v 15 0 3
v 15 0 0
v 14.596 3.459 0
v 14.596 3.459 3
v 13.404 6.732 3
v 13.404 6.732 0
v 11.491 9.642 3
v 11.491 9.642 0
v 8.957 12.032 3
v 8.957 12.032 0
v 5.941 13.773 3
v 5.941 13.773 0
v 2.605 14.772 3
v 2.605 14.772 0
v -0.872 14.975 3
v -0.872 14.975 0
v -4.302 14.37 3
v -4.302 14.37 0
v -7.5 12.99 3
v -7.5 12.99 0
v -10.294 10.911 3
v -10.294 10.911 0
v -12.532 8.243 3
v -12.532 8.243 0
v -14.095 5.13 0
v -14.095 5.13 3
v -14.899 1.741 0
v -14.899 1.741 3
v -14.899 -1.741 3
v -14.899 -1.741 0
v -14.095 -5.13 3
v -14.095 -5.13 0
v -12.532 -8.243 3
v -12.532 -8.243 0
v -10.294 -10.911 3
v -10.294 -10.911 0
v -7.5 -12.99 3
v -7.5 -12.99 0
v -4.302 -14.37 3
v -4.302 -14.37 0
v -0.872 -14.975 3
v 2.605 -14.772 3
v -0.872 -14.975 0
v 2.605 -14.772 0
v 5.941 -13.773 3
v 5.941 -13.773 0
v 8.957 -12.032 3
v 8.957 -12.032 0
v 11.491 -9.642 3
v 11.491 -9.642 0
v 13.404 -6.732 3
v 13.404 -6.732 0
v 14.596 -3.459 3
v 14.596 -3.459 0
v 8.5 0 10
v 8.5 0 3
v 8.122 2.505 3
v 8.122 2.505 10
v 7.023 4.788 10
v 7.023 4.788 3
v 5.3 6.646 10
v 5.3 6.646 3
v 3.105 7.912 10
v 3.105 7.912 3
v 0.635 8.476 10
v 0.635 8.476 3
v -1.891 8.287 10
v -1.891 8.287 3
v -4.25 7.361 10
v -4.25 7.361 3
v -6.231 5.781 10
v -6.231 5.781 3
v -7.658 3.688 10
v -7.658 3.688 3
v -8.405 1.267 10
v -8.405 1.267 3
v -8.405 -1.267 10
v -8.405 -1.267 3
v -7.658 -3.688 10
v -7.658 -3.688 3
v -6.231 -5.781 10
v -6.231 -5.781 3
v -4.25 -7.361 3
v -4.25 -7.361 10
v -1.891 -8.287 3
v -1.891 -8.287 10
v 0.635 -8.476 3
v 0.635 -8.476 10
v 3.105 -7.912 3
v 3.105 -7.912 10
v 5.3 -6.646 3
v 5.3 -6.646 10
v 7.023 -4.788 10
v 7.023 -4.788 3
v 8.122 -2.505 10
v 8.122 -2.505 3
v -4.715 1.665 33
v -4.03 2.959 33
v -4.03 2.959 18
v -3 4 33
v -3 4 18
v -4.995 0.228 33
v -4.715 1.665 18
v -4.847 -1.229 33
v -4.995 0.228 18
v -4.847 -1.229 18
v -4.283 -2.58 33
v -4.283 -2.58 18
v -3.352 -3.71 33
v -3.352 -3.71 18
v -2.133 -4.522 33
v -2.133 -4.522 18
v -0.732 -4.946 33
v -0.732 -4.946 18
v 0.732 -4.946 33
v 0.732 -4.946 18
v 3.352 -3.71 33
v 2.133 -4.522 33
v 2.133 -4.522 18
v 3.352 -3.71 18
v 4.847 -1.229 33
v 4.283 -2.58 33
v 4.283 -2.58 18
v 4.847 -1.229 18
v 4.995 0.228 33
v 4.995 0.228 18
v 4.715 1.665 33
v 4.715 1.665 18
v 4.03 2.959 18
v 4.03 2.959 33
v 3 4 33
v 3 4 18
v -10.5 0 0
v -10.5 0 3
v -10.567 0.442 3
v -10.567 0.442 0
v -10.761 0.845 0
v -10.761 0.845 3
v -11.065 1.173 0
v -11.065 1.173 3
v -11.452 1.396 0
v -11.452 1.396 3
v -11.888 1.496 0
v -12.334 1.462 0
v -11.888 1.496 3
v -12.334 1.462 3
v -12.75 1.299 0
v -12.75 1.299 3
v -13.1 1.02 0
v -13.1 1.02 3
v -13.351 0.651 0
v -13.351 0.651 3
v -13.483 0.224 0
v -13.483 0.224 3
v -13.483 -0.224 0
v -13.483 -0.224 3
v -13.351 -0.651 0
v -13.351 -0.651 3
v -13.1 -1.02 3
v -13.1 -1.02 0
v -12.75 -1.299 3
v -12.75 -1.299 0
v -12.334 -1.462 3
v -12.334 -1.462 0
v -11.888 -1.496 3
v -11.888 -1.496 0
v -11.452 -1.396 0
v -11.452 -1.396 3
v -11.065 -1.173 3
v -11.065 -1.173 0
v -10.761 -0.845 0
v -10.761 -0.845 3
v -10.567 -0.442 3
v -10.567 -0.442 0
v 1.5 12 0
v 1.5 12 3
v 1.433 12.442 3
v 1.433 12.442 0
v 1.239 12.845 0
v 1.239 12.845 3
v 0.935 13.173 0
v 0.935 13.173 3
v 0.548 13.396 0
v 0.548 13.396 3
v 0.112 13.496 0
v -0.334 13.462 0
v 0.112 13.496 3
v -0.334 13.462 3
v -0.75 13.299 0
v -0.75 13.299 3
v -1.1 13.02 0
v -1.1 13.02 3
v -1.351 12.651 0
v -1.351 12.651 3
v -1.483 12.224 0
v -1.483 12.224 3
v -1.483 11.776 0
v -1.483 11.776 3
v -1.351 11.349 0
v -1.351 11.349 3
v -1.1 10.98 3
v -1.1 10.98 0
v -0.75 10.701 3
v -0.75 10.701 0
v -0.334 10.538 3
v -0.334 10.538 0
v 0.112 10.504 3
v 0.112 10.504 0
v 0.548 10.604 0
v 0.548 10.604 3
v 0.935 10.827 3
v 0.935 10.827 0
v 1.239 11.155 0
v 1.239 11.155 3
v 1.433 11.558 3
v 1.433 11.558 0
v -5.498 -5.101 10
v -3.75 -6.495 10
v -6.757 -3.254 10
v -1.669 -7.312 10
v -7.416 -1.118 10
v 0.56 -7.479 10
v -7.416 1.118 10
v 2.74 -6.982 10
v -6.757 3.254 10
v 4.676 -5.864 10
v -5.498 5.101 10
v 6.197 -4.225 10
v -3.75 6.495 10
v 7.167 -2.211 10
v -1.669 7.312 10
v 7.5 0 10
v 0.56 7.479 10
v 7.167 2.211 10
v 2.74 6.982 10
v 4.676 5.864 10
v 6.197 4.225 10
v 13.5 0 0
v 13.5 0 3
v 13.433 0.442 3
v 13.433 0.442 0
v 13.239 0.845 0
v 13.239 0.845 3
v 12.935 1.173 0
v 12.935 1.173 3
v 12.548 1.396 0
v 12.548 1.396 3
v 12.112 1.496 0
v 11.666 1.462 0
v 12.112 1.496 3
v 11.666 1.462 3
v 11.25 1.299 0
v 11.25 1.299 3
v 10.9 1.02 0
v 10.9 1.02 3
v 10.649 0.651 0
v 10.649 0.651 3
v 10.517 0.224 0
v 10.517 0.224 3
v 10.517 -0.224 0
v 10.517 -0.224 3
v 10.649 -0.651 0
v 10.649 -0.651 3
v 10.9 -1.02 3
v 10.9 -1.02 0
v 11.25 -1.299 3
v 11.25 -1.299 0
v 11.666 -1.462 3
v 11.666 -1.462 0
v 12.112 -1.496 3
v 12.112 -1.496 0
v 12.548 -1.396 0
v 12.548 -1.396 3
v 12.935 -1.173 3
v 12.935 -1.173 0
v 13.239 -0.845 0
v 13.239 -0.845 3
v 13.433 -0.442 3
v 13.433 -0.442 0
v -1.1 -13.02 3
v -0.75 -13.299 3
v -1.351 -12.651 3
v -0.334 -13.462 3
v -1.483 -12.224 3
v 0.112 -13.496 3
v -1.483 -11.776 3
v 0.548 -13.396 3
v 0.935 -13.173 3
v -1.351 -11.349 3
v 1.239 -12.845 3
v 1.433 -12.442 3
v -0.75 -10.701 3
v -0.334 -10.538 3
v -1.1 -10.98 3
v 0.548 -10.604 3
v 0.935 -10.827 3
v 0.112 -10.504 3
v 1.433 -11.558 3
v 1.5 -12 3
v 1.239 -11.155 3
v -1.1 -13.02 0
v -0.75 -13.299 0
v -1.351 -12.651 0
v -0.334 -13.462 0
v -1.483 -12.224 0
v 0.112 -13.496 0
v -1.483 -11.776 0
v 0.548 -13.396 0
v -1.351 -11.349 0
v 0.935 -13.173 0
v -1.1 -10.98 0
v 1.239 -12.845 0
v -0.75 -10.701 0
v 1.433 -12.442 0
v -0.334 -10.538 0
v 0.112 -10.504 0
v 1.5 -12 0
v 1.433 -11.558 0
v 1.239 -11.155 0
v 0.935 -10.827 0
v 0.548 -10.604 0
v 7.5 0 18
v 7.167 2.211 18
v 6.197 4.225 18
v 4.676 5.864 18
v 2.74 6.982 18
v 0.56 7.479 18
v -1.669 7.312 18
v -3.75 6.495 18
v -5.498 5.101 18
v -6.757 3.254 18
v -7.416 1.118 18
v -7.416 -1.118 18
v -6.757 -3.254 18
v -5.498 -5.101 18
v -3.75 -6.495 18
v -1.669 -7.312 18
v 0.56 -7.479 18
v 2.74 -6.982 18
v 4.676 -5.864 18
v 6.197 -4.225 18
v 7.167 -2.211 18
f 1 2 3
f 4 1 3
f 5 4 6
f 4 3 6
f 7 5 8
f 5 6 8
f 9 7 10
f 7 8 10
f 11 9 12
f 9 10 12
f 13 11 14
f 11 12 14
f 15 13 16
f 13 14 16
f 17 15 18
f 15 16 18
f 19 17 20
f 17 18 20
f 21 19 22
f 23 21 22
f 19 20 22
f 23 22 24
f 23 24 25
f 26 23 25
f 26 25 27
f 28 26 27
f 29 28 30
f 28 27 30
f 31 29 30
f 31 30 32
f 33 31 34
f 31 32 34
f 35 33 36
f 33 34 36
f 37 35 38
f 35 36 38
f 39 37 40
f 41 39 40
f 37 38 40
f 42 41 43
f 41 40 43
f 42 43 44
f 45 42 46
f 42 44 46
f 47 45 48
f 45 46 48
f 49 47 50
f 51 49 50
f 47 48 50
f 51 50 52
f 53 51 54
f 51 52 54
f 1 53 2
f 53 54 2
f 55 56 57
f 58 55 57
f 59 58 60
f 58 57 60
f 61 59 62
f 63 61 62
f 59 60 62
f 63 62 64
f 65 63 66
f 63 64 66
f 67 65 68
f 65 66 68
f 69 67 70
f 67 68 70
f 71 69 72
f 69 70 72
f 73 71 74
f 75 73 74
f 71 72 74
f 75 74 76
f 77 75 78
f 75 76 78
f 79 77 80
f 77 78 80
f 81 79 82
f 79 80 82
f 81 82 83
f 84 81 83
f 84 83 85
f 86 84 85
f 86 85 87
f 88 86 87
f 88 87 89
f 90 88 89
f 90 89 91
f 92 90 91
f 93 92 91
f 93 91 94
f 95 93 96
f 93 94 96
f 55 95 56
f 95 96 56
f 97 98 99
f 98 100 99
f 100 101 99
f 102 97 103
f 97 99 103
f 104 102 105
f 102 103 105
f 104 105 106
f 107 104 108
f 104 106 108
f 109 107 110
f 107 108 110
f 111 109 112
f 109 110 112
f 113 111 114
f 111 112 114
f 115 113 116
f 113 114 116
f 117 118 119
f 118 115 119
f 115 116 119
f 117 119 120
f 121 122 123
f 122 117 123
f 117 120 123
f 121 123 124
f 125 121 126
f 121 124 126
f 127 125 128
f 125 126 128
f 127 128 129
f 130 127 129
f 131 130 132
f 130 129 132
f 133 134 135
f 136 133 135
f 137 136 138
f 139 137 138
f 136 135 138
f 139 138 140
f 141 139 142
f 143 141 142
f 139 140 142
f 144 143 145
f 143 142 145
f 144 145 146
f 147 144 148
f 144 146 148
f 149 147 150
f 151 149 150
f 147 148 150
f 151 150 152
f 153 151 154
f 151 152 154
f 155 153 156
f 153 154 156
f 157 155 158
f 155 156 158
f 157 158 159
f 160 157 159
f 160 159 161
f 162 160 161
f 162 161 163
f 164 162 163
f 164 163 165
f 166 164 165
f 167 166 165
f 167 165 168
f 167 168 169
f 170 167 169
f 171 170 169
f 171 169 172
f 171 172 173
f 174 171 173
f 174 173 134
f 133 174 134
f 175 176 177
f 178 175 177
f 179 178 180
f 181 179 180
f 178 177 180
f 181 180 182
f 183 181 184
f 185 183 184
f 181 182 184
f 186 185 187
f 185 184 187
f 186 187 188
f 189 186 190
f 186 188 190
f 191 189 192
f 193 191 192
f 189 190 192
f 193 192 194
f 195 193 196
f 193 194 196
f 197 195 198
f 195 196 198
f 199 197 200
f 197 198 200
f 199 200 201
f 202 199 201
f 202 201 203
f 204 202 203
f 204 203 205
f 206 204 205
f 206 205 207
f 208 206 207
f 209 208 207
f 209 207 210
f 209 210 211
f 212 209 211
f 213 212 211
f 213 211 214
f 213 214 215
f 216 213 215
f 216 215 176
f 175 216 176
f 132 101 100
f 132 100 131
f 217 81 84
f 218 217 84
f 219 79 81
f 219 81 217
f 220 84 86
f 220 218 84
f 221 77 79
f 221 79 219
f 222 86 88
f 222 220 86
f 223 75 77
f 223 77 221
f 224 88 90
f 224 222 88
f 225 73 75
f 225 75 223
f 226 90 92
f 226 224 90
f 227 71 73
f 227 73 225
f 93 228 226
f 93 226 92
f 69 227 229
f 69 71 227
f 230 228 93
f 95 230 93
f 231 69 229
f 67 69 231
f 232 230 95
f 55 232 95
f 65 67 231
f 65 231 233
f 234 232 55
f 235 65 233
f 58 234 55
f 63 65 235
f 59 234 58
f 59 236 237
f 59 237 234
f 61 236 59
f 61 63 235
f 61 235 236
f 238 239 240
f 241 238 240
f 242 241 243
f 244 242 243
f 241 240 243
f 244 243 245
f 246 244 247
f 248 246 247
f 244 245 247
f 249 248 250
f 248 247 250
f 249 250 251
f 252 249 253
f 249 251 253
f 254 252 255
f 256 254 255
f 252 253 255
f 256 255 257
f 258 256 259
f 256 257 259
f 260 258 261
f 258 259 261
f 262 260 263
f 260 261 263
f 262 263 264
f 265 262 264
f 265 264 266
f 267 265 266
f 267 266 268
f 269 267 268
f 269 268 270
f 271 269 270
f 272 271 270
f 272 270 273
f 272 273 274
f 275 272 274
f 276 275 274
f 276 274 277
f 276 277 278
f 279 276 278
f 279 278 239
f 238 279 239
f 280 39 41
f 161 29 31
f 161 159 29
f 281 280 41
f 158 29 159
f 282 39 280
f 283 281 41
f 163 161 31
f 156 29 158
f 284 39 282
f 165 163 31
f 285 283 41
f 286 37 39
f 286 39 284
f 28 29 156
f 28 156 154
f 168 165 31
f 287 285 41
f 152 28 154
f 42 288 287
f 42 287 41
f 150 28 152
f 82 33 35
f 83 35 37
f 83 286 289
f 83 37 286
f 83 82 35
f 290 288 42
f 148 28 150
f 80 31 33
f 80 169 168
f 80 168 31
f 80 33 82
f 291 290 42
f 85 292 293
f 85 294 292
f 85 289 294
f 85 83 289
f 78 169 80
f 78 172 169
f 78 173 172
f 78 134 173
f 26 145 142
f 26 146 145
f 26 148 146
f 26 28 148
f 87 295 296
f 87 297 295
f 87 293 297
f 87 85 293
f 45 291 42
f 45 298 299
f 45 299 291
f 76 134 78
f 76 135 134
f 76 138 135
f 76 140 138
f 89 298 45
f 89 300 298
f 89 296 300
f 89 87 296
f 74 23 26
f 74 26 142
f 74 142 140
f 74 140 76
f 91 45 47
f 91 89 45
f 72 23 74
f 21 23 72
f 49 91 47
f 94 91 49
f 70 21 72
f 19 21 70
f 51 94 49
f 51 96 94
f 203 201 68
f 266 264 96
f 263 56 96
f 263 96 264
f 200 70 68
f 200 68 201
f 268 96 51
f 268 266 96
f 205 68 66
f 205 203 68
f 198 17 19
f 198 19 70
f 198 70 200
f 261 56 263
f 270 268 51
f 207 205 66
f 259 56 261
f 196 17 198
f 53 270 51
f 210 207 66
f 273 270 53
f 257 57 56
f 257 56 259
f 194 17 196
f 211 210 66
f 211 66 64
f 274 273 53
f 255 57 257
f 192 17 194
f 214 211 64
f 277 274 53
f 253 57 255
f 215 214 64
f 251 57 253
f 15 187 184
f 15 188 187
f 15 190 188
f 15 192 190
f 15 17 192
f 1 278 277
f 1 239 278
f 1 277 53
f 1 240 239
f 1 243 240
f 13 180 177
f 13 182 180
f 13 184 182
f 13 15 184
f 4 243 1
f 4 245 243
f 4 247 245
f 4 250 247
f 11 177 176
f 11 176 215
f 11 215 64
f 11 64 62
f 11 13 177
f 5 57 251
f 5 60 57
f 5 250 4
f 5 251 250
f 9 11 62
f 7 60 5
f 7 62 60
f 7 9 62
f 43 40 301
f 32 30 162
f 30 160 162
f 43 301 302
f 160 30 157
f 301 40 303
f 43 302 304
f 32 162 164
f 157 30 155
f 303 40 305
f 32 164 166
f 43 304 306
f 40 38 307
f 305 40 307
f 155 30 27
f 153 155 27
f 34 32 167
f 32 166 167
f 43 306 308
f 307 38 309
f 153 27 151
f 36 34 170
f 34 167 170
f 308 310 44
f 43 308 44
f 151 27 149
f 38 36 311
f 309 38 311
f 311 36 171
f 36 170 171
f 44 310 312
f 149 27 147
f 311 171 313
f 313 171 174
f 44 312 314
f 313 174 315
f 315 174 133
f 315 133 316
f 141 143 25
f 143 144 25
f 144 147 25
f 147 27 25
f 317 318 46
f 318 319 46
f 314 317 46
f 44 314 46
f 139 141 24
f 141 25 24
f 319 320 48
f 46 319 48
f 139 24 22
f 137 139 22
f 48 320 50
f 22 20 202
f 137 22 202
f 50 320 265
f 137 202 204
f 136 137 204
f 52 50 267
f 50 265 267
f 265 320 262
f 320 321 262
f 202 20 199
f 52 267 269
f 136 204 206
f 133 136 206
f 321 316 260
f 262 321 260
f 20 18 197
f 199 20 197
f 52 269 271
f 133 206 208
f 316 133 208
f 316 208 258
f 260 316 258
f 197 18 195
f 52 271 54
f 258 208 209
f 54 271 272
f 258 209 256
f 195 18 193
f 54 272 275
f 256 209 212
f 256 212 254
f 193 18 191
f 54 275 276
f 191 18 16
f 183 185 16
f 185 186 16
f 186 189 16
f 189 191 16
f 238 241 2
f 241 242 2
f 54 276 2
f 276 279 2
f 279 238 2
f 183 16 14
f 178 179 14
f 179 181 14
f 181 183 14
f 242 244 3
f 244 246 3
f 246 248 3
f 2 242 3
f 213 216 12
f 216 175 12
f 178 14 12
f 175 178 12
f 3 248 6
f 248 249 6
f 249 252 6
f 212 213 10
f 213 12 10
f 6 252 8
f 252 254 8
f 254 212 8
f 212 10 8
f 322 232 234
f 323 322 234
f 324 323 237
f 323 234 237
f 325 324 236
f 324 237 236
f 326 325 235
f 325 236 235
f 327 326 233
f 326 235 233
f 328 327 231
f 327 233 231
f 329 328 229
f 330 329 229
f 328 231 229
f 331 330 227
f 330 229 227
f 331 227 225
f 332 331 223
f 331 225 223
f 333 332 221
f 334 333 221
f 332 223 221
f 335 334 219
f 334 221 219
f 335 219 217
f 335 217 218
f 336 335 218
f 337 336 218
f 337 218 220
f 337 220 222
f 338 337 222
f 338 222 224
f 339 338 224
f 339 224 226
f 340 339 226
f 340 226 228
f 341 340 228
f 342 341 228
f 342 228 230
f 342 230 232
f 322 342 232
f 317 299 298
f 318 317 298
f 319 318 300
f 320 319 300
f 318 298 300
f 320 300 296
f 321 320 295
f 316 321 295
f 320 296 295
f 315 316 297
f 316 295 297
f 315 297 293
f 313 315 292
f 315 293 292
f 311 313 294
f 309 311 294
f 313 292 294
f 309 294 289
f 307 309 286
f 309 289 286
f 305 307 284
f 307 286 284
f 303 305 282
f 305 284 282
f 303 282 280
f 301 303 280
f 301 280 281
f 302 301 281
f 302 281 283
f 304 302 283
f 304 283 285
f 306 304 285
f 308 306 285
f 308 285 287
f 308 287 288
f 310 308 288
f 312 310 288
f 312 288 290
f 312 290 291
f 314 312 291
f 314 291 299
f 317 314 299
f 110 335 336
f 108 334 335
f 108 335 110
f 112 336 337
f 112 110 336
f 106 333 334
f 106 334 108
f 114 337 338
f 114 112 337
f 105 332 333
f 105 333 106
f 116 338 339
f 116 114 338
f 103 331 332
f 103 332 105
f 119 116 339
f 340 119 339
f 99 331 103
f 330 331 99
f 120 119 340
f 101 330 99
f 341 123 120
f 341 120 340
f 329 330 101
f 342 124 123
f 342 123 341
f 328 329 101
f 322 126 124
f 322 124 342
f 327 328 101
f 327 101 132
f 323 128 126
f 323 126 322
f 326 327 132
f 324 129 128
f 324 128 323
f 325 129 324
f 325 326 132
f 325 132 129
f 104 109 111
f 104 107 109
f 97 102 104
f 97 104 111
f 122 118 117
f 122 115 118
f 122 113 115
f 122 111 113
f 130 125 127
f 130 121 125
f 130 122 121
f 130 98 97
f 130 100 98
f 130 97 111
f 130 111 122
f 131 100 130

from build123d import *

# Parameters (mm, degrees)
SKETCH_1_R          = 15
EXTRUDE_1_DEPTH     = 3
SKETCH_2_R          = 1.5
CUT_EXTRUDE_1_DEPTH = 22.424285286
SKETCH_5_R          = 5
EXTRUDE_2_DEPTH     = 30
SKETCH_7_R          = 7.5
EXTRUDE_4_DEPTH     = 15
CUT_EXTRUDE_START   = -15
CUT_EXTRUDE_2_DEPTH = 15
SKETCH_9_R          = 8.5
EXTRUDE_5_DEPTH     = 7


with BuildPart() as part:
    # 草图1 → 凸台-拉伸1 (new body)
    with BuildSketch(Plane.XY):
        Circle(SKETCH_1_R)
    extrude(amount=EXTRUDE_1_DEPTH)

    # 草图2 → 切除-拉伸1 (cut, through all)
    with BuildSketch(Plane.XY.offset(3)):
        with Locations((0, 12)):
            Circle(SKETCH_2_R)
        with Locations((12, 0)):
            Circle(SKETCH_2_R)
        with Locations((0, -12)):
            Circle(SKETCH_2_R)
        with Locations((-12, 0)):
            Circle(SKETCH_2_R)
    extrude(amount=-CUT_EXTRUDE_1_DEPTH, mode=Mode.SUBTRACT)

    # 草图5 → 凸台-拉伸2 (add)
    with BuildSketch(Plane.XY.offset(3)):
        Circle(SKETCH_5_R)
    extrude(amount=EXTRUDE_2_DEPTH)

    # 草图7 → 凸台-拉伸4 (add)
    with BuildSketch(Plane.XY.offset(3)):
        Circle(SKETCH_7_R)
    extrude(amount=EXTRUDE_4_DEPTH)

    # 草图8 → 切除-拉伸2 (cut)
    with BuildSketch(Plane.XY.offset(33).offset(CUT_EXTRUDE_START)):
        with BuildLine():
            Line((-3, 4), (3, 4))
            ThreePointArc((3, 4), (0, 5), (-3, 4))
        make_face()
    extrude(amount=CUT_EXTRUDE_2_DEPTH, mode=Mode.SUBTRACT)

    # 草图9 → 凸台-拉伸5 (add)
    with BuildSketch(Plane.XY.offset(3)):
        Circle(SKETCH_9_R)
    extrude(amount=EXTRUDE_5_DEPTH)


solid = part.part
